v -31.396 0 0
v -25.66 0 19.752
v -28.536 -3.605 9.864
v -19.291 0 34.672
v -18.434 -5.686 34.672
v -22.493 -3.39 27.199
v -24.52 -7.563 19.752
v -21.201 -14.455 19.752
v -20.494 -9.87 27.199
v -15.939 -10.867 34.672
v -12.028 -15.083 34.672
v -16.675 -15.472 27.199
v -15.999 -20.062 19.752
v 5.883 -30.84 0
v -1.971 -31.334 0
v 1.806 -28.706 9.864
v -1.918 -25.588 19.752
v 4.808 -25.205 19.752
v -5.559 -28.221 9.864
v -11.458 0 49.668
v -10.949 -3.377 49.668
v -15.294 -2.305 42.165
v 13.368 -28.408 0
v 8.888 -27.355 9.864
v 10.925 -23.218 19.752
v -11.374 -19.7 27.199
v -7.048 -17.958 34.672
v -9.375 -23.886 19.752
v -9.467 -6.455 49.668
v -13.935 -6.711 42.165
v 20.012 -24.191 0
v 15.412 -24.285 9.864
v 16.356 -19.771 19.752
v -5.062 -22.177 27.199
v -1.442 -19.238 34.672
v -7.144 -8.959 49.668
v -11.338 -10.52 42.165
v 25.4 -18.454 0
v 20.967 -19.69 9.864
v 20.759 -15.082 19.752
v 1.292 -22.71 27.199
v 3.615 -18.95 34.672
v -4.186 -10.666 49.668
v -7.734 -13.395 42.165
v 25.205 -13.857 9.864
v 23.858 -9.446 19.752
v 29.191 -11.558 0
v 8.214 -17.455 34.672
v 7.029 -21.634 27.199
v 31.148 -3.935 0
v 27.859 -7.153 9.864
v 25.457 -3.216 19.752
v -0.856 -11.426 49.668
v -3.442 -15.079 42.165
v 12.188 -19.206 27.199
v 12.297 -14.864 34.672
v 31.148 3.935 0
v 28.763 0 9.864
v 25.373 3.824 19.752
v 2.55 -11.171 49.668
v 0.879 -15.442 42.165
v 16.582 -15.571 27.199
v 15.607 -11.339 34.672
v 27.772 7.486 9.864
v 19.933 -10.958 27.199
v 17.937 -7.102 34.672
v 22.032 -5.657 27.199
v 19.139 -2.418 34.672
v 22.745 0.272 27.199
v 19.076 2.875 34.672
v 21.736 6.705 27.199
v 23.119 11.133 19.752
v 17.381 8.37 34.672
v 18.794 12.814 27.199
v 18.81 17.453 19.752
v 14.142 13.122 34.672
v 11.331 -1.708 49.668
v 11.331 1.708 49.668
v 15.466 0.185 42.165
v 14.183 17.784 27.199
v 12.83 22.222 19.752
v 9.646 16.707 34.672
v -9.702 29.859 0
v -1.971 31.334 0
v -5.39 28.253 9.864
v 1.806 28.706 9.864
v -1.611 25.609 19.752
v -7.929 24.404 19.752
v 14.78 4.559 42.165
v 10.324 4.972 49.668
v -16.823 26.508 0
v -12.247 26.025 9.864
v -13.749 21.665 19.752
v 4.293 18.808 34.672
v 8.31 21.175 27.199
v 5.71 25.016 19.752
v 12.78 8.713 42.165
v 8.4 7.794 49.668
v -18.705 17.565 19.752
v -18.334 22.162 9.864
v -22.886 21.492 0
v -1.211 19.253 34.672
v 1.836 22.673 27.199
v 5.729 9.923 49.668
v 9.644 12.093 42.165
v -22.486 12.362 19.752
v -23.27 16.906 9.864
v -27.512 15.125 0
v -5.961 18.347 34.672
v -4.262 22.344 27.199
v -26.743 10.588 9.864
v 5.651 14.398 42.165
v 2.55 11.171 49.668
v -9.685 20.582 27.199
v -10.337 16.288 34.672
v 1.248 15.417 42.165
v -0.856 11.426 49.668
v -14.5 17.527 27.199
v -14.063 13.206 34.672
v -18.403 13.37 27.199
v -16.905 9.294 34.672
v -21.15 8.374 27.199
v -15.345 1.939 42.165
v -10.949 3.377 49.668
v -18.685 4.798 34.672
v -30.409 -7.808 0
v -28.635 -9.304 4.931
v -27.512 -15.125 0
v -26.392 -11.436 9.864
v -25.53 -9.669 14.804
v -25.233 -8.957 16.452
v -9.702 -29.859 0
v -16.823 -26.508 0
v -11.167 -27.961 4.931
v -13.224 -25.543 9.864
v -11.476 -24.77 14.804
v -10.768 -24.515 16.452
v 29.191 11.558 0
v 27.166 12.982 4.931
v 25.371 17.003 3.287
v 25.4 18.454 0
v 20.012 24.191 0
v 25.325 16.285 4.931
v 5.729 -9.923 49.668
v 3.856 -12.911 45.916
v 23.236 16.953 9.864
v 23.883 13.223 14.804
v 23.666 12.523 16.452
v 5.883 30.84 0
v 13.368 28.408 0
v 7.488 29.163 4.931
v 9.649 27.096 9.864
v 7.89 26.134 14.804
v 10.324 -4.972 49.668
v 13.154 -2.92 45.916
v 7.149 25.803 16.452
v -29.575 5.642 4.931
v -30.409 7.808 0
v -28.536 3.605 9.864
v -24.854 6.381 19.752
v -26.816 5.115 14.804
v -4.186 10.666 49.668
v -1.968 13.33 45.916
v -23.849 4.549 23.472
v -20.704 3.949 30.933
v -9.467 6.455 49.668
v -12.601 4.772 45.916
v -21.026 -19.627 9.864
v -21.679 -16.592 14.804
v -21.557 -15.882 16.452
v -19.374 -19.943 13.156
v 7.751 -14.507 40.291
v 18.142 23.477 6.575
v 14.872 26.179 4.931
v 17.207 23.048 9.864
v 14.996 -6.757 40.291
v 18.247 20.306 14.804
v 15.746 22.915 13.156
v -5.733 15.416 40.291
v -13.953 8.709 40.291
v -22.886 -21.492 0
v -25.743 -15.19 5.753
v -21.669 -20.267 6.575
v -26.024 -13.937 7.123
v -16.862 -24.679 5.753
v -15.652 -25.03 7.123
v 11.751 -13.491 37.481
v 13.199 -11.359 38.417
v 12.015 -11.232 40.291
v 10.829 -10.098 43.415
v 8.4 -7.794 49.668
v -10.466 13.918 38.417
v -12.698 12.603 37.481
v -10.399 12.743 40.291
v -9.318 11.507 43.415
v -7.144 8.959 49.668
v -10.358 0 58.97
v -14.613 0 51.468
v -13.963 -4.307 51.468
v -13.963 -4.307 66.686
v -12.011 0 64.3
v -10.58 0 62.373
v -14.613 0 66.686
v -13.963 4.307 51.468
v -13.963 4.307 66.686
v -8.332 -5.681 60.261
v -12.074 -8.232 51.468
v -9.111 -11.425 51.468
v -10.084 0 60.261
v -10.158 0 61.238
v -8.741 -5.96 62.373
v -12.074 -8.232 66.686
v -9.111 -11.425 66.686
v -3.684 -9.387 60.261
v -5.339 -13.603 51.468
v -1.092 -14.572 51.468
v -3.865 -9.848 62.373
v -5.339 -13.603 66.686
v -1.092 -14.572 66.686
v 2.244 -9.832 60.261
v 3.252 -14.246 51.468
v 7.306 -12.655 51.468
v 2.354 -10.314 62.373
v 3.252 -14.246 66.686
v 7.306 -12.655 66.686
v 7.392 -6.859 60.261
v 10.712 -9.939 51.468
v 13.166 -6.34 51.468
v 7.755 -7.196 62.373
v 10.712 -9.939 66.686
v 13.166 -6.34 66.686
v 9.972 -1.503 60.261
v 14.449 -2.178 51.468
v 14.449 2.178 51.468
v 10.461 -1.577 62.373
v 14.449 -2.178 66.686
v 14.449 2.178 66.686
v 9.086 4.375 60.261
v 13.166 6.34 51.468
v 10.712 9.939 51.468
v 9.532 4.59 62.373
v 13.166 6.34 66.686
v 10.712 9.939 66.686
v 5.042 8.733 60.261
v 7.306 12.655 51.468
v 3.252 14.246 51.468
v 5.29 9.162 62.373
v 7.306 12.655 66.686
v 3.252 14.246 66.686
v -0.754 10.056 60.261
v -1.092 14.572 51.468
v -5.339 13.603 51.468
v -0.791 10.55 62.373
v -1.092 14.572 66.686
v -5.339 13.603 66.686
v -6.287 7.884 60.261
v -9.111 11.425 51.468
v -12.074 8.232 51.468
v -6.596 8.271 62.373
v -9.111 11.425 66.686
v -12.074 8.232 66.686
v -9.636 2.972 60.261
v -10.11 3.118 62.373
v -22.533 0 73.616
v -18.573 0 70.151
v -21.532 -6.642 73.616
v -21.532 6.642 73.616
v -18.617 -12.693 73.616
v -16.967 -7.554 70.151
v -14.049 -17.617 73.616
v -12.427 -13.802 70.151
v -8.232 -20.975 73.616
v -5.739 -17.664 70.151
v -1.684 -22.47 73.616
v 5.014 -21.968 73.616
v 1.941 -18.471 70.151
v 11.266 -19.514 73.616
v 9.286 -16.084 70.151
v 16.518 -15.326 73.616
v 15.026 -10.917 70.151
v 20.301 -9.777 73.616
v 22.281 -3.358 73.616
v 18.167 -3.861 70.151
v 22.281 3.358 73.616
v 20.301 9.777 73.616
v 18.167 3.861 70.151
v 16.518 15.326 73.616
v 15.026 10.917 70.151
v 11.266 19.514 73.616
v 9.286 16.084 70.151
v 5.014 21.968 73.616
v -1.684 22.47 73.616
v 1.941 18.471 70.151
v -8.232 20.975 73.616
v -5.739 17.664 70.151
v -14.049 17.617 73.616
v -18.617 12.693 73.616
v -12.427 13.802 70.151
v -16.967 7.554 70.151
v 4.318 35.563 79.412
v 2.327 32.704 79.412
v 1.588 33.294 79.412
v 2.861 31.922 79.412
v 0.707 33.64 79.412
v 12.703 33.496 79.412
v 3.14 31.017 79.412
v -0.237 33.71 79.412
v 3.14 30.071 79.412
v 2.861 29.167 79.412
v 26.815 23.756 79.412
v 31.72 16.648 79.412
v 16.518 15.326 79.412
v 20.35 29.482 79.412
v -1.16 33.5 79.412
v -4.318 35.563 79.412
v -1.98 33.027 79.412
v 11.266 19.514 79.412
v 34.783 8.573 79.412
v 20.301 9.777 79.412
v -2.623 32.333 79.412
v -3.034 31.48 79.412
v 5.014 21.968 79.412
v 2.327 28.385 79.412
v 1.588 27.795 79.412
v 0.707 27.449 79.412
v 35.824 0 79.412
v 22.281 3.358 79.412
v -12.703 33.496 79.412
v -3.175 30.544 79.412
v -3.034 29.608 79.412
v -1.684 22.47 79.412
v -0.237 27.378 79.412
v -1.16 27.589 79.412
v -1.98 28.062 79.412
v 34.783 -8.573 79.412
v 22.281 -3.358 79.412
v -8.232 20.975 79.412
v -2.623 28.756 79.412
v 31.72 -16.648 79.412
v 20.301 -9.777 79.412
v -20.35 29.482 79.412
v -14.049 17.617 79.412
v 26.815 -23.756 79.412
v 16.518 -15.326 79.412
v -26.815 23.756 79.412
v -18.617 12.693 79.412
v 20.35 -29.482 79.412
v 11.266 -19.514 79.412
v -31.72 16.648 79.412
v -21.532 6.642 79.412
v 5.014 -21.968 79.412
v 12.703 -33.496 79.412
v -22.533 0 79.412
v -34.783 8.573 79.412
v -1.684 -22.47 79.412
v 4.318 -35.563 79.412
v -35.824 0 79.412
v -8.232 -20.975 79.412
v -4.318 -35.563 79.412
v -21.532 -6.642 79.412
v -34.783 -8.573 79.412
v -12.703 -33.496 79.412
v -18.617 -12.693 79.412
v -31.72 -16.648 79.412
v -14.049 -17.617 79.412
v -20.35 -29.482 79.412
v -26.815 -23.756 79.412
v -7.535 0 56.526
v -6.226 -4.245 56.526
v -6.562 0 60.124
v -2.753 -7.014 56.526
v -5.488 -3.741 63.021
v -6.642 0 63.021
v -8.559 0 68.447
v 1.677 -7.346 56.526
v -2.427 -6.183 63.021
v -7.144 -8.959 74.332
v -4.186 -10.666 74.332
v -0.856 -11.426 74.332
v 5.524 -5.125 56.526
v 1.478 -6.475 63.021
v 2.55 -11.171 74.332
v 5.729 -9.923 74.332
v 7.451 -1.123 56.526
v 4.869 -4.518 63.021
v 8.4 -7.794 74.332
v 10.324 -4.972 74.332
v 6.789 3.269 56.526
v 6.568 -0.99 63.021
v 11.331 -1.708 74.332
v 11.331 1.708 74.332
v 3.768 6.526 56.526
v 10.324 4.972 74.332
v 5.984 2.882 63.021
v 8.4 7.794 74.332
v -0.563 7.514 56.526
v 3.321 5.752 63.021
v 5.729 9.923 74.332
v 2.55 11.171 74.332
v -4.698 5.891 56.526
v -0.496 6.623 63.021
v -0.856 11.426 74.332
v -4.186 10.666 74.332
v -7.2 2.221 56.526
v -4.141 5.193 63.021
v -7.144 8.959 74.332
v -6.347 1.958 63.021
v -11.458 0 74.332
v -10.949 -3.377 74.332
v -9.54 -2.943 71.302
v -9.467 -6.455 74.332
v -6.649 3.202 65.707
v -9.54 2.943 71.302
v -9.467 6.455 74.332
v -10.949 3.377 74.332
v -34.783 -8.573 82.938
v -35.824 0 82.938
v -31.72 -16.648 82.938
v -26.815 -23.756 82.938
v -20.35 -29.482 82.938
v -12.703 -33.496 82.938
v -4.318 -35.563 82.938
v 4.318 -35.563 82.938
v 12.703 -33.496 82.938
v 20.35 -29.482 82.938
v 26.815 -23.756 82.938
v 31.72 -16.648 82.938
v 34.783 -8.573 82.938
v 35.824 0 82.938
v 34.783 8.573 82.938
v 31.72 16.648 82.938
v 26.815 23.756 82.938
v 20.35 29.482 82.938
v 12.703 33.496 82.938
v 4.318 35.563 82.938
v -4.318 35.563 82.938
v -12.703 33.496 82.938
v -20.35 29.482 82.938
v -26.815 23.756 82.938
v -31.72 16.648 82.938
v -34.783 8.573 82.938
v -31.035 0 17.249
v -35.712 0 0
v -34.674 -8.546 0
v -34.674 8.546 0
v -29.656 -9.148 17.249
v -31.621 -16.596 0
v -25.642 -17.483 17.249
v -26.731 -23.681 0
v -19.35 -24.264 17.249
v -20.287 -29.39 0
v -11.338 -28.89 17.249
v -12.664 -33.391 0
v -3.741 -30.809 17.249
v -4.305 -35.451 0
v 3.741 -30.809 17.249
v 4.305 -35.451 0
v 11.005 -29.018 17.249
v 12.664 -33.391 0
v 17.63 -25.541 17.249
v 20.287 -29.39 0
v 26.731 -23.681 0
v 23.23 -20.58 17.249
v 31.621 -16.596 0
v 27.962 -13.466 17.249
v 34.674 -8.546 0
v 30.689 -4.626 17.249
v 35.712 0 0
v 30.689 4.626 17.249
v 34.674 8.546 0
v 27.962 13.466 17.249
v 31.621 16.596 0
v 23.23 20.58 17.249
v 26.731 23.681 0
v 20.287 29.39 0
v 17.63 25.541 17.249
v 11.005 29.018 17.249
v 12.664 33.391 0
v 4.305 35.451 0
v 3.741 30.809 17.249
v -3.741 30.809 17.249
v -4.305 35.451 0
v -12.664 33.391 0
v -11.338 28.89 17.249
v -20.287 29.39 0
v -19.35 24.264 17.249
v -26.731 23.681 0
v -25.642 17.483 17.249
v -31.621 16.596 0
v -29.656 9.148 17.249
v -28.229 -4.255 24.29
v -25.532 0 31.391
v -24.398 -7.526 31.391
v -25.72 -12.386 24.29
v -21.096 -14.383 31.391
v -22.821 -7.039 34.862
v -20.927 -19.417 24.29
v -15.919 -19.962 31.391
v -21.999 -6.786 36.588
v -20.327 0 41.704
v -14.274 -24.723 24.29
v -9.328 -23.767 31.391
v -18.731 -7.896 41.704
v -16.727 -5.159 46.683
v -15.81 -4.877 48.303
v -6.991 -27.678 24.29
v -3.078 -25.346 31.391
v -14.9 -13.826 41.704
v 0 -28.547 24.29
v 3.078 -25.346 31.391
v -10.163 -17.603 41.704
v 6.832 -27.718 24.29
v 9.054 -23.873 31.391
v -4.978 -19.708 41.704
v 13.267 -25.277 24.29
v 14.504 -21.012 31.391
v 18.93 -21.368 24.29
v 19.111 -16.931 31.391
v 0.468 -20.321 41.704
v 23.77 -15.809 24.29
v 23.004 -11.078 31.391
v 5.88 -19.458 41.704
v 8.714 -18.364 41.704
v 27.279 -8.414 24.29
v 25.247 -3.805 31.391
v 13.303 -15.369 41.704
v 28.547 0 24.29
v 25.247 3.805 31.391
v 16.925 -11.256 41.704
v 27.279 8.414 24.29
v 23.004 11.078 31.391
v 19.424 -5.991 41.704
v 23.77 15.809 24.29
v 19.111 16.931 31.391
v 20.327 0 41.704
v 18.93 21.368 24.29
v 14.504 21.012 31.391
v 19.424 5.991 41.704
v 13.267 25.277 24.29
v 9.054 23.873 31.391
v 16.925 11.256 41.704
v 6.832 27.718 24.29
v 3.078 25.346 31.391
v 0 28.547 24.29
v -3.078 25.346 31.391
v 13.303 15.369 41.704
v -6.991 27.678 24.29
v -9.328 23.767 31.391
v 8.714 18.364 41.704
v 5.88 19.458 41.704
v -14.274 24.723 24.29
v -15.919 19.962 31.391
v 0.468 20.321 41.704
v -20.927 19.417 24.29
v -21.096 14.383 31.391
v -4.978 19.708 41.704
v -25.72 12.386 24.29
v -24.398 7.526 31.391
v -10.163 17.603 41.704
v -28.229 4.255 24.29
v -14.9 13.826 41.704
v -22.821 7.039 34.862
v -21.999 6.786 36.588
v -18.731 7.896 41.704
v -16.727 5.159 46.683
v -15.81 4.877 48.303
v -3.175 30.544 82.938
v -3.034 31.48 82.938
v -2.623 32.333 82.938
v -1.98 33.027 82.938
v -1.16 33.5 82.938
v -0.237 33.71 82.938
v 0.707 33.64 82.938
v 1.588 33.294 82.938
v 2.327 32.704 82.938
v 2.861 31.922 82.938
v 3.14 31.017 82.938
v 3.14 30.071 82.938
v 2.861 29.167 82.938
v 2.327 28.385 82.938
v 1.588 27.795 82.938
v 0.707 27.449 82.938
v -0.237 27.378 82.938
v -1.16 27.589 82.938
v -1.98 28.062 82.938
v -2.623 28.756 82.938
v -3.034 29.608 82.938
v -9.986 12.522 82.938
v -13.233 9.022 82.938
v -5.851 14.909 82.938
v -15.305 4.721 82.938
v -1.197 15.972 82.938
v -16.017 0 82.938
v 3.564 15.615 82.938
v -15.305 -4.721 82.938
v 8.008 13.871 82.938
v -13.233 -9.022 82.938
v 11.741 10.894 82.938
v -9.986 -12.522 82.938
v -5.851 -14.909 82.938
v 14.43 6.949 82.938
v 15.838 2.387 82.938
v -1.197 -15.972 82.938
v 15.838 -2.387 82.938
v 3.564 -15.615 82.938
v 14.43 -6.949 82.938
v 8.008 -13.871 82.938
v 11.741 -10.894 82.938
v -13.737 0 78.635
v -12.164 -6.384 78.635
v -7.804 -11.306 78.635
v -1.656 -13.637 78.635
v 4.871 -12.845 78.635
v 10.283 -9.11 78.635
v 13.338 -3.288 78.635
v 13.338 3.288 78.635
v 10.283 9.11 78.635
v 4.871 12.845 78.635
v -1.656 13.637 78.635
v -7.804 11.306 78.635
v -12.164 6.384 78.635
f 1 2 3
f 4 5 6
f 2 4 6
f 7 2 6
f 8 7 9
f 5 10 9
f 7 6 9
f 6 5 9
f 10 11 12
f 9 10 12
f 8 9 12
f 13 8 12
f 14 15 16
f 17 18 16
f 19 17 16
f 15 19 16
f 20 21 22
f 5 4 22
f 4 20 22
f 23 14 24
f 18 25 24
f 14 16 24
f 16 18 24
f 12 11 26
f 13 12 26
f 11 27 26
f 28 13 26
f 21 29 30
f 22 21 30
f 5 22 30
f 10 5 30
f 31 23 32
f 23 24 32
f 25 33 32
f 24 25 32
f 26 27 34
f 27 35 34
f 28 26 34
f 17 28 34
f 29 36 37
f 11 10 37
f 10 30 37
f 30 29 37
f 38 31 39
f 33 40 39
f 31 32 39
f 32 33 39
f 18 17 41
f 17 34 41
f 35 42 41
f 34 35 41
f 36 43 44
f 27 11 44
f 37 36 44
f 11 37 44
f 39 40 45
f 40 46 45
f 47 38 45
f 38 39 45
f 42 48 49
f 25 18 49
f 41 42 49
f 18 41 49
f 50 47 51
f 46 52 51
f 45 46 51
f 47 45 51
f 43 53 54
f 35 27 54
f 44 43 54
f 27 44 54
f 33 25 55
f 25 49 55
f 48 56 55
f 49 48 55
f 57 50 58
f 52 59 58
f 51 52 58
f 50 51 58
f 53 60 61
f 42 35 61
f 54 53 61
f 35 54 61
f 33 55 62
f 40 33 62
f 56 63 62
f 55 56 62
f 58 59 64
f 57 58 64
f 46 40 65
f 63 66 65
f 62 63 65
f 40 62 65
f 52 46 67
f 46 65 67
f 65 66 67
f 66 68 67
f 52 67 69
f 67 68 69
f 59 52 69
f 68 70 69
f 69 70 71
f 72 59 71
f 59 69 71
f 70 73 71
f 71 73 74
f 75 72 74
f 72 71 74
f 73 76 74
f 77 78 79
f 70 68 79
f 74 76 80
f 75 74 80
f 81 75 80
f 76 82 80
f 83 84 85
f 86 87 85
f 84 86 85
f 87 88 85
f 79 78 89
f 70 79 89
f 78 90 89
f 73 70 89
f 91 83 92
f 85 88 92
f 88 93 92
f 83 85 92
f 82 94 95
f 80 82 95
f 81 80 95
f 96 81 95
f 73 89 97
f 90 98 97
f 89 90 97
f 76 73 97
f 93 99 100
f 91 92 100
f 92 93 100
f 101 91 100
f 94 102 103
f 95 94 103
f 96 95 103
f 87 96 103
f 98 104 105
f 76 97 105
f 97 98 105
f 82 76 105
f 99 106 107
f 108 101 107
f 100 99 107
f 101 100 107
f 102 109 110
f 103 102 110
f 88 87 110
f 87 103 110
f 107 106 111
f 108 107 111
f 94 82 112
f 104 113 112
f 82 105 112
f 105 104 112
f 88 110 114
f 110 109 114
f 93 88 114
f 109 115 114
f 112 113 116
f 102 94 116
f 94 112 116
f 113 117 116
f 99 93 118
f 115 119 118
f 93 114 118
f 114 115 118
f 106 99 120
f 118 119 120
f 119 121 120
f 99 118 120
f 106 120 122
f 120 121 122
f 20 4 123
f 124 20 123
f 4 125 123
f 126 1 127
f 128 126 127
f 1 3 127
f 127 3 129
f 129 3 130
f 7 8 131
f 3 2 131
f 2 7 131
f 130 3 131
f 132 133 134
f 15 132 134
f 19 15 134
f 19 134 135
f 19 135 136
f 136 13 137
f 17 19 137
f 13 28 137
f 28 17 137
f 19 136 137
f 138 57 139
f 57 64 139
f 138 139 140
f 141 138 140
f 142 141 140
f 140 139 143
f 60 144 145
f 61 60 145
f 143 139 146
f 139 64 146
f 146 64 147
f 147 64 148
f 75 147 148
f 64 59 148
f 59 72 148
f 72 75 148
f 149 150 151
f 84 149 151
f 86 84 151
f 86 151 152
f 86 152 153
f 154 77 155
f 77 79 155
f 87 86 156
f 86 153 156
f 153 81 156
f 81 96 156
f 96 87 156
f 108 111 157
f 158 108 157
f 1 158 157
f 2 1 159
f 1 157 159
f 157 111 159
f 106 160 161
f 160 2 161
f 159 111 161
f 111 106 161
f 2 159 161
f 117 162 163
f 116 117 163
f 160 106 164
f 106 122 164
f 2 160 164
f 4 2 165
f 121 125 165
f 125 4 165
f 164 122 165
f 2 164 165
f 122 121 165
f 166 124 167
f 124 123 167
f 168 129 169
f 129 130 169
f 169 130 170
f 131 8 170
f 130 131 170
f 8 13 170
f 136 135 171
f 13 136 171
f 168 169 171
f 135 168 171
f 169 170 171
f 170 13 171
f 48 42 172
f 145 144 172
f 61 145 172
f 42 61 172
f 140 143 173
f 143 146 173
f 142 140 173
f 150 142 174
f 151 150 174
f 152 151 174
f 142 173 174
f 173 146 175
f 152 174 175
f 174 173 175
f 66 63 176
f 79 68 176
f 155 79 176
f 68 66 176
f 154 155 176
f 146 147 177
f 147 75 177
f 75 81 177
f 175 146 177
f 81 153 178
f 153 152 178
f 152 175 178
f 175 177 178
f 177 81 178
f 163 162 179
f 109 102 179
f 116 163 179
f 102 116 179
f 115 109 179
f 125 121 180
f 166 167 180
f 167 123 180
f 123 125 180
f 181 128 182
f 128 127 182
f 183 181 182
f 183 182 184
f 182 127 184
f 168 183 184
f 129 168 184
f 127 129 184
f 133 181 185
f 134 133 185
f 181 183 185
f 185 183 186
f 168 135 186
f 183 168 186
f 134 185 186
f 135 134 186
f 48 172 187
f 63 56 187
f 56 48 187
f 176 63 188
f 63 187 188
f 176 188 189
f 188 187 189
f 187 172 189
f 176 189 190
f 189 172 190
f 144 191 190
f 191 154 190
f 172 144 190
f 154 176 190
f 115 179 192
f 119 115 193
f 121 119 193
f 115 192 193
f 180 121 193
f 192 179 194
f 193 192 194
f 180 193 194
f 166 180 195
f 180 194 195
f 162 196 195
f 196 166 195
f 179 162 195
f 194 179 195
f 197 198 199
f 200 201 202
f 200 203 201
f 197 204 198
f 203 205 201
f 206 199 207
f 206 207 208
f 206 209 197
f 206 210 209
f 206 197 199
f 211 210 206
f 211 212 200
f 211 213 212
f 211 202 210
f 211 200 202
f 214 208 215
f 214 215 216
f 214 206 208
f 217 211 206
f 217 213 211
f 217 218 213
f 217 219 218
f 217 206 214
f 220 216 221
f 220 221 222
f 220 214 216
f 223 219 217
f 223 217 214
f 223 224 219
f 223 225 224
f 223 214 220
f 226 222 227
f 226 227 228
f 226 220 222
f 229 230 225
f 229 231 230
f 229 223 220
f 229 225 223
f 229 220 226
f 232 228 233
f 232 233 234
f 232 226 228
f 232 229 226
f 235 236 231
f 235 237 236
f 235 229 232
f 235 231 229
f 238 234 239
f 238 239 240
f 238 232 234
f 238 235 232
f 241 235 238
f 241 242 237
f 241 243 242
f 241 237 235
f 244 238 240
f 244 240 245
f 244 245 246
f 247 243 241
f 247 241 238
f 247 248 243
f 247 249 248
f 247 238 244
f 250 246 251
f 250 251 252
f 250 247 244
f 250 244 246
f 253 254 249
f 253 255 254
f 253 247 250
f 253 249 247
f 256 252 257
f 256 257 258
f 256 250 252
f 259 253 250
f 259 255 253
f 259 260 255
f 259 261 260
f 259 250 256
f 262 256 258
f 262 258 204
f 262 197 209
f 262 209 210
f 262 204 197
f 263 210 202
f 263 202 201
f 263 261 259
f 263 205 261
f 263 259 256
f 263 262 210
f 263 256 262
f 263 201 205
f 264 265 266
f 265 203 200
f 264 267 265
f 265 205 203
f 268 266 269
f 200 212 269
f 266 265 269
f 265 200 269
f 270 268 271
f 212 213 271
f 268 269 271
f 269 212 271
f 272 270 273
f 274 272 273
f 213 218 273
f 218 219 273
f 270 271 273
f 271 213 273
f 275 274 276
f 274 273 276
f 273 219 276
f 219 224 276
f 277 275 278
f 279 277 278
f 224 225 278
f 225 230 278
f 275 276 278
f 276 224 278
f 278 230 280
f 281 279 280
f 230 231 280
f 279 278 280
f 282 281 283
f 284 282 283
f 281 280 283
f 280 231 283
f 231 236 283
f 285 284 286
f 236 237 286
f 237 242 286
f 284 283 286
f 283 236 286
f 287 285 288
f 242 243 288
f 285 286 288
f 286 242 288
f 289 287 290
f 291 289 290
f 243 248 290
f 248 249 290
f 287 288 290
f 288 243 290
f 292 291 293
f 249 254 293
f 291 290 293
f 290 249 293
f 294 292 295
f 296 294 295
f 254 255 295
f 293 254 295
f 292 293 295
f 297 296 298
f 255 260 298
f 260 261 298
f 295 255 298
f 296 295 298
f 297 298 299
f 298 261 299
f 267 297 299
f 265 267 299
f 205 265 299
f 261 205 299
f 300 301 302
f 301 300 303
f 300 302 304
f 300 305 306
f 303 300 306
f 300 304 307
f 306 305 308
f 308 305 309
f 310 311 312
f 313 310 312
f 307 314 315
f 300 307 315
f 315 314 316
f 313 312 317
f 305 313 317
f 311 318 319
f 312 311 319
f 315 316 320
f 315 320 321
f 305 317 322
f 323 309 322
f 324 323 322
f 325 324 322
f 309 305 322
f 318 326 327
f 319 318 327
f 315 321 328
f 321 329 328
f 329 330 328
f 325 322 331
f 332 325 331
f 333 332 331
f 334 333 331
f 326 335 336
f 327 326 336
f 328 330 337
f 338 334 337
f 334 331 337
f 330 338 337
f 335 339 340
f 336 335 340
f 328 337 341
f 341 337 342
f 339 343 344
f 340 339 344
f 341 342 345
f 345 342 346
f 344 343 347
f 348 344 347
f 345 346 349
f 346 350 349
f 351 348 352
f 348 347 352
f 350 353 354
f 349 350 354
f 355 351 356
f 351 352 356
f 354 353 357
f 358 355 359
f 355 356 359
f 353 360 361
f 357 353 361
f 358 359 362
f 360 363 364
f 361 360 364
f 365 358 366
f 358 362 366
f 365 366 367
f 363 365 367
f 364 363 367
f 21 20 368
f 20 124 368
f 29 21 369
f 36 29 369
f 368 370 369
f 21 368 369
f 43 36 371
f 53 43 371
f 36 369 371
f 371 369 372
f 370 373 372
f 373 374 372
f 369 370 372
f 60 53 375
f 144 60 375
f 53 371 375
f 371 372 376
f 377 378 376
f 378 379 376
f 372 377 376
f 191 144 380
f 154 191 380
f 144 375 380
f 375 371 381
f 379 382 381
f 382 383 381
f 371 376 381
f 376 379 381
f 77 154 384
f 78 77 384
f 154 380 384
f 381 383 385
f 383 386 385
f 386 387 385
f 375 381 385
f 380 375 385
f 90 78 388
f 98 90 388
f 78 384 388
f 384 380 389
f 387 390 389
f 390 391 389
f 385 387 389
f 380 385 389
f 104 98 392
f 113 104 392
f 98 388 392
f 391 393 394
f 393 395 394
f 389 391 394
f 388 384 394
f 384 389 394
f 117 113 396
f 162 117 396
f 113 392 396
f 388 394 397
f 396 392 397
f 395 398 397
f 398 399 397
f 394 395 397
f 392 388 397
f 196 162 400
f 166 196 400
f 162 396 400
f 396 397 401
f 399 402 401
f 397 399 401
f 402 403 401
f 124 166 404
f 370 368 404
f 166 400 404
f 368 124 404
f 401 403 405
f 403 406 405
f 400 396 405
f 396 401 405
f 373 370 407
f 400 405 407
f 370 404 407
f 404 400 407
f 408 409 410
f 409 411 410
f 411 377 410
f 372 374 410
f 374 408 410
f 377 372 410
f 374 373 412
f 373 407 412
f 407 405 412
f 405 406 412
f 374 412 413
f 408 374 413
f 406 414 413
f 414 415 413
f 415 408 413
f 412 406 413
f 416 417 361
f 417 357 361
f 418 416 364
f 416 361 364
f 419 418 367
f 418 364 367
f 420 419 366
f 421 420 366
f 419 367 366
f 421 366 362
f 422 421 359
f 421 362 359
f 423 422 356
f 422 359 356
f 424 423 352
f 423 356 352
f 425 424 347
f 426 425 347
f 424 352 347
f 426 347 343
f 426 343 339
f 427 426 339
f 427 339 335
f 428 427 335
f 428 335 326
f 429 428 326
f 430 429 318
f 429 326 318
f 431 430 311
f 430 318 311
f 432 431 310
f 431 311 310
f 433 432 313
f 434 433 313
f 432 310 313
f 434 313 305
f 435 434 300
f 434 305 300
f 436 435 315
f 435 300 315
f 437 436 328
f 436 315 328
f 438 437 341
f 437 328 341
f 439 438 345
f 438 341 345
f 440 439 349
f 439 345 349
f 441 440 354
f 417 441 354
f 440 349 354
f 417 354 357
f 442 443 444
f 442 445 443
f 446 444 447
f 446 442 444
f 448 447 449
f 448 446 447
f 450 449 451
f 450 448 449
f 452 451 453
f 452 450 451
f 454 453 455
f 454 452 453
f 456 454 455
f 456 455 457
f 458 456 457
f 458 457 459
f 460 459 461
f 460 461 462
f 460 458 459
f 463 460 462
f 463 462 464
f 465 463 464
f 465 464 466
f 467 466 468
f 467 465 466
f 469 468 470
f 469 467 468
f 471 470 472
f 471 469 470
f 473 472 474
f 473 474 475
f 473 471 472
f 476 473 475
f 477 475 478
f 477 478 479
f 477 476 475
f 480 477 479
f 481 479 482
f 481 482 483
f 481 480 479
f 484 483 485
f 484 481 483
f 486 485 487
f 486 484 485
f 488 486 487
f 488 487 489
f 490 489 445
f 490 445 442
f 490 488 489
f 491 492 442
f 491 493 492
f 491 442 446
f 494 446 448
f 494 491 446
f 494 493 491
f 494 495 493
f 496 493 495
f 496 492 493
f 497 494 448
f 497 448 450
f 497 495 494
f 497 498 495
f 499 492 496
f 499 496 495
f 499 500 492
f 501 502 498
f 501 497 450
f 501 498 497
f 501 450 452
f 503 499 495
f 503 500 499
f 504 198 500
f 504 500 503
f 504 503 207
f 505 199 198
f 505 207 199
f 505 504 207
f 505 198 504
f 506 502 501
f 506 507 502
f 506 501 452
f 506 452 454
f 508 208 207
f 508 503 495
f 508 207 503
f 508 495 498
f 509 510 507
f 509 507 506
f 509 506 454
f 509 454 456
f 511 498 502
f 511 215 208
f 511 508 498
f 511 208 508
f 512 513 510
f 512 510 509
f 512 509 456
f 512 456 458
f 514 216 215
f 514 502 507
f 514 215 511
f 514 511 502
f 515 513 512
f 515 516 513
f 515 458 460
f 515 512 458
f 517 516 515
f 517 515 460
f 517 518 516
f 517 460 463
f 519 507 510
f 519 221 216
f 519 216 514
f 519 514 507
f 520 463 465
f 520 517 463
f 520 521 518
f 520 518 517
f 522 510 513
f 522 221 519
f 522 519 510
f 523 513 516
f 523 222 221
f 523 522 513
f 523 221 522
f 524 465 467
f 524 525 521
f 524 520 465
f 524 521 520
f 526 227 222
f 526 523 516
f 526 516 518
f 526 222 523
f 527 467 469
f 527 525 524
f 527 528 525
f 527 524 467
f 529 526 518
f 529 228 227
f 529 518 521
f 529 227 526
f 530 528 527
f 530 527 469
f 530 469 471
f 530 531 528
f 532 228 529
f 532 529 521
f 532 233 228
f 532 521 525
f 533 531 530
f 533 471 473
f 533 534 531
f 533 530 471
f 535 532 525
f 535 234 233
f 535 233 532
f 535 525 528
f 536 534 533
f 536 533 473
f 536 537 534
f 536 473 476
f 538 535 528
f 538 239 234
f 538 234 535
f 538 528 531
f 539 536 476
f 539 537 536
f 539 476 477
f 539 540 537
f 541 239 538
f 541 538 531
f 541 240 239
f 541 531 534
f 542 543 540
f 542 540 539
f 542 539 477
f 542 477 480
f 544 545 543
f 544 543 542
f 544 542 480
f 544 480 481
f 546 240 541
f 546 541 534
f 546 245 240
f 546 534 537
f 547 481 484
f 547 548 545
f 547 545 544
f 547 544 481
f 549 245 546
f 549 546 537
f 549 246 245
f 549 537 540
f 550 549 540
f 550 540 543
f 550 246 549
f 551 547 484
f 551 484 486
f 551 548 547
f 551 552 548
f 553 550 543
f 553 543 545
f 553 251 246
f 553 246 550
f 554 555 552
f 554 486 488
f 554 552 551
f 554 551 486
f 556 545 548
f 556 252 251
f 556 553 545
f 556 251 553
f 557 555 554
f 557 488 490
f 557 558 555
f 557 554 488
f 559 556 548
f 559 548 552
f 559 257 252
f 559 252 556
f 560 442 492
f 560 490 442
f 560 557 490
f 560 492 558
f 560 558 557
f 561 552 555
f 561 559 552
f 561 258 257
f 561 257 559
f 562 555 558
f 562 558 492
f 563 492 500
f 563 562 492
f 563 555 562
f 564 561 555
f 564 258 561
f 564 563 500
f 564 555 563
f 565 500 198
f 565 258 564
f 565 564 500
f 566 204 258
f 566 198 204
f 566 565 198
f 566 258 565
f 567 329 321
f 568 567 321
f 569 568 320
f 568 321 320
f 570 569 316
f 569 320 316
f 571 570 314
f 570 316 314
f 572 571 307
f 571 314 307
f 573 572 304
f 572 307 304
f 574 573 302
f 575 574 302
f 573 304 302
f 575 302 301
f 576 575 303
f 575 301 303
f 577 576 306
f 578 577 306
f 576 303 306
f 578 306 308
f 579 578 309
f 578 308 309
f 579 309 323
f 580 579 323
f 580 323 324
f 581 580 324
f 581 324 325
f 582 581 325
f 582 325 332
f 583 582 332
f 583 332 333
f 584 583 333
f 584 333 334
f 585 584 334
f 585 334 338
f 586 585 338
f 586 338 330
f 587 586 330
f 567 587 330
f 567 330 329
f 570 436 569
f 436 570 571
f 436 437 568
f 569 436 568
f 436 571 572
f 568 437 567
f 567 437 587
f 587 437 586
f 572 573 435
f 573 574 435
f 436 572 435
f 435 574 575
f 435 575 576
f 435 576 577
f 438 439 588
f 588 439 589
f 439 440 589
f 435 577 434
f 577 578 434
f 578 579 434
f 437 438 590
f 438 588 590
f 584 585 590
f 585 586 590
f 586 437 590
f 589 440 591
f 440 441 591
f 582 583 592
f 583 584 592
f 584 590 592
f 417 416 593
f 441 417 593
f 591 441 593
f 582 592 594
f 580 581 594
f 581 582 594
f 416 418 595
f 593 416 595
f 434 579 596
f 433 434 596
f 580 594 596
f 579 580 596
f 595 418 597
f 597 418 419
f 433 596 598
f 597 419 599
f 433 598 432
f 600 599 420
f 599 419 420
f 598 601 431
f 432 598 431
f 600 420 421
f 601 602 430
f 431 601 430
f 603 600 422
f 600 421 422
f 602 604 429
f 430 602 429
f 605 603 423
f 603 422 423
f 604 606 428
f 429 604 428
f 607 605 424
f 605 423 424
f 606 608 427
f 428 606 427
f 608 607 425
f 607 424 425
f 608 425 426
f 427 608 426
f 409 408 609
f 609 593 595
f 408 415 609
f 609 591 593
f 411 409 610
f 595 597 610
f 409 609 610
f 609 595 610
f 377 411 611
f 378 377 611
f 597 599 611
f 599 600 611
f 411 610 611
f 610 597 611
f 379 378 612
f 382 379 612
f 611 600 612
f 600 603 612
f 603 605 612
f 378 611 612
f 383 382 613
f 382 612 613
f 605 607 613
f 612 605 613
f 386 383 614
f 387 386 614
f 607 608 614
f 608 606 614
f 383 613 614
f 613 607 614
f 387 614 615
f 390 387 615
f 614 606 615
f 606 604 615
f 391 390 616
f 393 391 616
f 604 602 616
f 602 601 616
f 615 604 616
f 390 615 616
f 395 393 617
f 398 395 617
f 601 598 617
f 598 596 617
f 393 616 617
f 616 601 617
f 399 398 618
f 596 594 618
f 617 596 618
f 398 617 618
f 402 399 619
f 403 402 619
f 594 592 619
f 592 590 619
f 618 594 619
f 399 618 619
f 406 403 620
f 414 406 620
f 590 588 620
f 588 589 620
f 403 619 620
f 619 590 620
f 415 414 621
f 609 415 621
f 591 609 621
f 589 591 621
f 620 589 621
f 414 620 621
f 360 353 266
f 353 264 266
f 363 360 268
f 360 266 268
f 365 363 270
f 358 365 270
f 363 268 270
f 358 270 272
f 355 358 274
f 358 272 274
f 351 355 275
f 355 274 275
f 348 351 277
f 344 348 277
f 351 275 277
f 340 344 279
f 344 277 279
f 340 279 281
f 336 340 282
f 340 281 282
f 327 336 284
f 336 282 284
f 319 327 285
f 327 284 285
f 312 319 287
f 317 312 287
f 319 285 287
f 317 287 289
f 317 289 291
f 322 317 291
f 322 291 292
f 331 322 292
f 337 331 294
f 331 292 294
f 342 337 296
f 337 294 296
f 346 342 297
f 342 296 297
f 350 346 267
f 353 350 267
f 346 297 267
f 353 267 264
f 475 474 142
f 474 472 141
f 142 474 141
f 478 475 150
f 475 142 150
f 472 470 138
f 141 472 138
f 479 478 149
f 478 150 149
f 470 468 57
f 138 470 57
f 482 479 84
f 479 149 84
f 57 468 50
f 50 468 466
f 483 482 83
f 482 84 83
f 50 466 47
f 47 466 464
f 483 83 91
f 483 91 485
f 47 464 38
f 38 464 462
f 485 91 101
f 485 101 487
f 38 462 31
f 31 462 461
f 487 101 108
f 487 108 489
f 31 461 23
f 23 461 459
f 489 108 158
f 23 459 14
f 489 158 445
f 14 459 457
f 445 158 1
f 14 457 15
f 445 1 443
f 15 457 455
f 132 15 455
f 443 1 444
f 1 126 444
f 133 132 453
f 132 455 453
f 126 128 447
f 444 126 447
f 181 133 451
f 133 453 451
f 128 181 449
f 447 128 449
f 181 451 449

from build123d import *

# Parameters (mm, degrees)
F4_D     = 6.35
F4_DEPTH = 12.7
F4_TIP   = 1.9077324654


with BuildPart() as f1:
    # F0 (on Front) → F1 (revolve)
    with BuildSketch(Plane.XZ):
        with BuildLine():
            add(Edge.make_bspline(
                [(-35.711620003, 0), (-33.6991355754, 8.3739323563), (-29.3174594603, 25.4988872735), (-19.6445835619, 43.3868067126), (-14.6126173957, 51.4680505725)],
                knots=[0, 0, 0, 0, 0.4850144004, 1, 1, 1, 1], degree=3))
            Line((-35.711620003, 0), (-31.3956774771, 0))
            add(Edge.make_bspline(
                [(-31.3956774771, 0), (-29.3449089655, 7.9159356711), (-25.0874906142, 24.3495041979), (-16.1110445435, 41.0247078901), (-11.4584900439, 49.6675819159)],
                knots=[0, 0, 0, 0, 0.4816930958, 1, 1, 1, 1], degree=3))
            add(Edge.make_bspline(
                [(-11.4584900439, 49.6675819159), (-9.2111257589, 52.9541958774), (-3.7759486318, 61.5209078018), (-9.2010886072, 69.393788099), (-11.4584900439, 74.3316113949)],
                knots=[0, 0, 0, 0, 0.4840360956, 1, 1, 1, 1], degree=3))
            Line((-11.4584900439, 74.3316113949), (-16.0165019333, 82.9376876354))
            Line((-16.0165019333, 82.9376876354), (-35.8239077032, 82.9376876354))
            Line((-35.8239077032, 82.9376876354), (-35.8239077032, 79.4118791819))
            Line((-35.8239077032, 79.4118791819), (-22.5325617939, 79.4118791819))
            Line((-22.5325617939, 79.4118791819), (-22.5325617939, 73.6162364483))
            Line((-22.5325617939, 73.6162364483), (-14.6126173957, 66.6863429164))
            add(Edge.make_bspline(
                [(-14.6126173957, 51.4680505725), (-12.1953186939, 55.8042941924), (-8.853870956, 59.7288834218), (-10.7295096303, 63.5019995765), (-14.6126173957, 66.6863429164)],
                knots=[0, 0, 0, 0, 0.5184258095, 1, 1, 1, 1], degree=3))
        make_face()
    revolve(axis=Axis((0, 0, 6.4593851566), (0, 0, 1)))

    # F4
    with Locations(Plane.XY.offset(82.9376876354)):
        with Locations((0, 30.5442549288)):
            Hole(F4_D / 2, depth=F4_DEPTH)
            with Locations((0, 0, -(F4_DEPTH + F4_TIP / 2))):  # 118° drill point
                Cone(0, F4_D / 2, F4_TIP, mode=Mode.SUBTRACT)


solid = f1.part
